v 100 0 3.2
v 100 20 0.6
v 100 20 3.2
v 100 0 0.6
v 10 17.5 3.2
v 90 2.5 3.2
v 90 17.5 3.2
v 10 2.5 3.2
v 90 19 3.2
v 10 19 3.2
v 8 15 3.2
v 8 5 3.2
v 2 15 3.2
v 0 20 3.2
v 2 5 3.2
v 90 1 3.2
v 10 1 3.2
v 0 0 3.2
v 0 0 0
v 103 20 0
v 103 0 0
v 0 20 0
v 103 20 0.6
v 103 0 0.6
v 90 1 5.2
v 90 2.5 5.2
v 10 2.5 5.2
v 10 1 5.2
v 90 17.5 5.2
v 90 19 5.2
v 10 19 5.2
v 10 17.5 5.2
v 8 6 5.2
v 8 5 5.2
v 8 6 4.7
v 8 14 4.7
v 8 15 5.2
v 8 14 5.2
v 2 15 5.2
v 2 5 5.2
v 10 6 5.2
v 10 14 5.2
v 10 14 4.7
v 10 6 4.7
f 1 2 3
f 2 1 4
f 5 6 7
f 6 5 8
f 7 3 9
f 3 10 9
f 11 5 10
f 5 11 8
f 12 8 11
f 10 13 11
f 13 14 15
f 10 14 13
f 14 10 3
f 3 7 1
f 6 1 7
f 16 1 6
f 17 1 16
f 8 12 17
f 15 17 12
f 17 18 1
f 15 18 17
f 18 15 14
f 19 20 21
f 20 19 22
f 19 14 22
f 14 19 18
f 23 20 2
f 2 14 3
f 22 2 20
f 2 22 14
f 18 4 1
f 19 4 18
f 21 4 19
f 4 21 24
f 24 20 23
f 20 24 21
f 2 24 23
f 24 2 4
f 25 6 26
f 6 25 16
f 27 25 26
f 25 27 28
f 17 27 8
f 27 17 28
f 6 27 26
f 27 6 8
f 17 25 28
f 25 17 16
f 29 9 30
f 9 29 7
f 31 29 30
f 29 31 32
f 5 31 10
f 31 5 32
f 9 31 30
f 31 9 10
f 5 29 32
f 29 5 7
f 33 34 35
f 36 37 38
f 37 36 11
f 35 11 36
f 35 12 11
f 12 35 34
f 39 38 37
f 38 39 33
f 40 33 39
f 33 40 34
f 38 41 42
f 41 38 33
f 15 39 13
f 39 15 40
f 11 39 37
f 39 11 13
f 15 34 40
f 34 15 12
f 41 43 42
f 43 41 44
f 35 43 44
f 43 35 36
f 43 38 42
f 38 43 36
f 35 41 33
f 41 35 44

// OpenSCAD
// Bag clip with living hinge - PETG, 0.4mm nozzle, no supports
// Printed open flat (two arms end-to-end), closes by folding 180deg about Y.
// Lower arm at origin, upper arm local origin at its hinge edge.

part = "arm_lower"; // [arm_lower, arm_upper, assembly]
cadverify_only = "";

/* Dimensions (mm) */
Lbody = 100;      // arm body length
Wbody = 20;       // arm width
Tbody = 3.2;      // arm thickness
Hhinge = 6;       // total hinge length (gap between bodies)
Hhalf = 3;        // hinge half length per arm
Thinge = 0.6;     // hinge thickness
Bgap = 2.0;       // bag thickness / closed gap
Ttot = Tbody + Bgap; // 5.2 closed inner top
Zpiv = Tbody + Bgap/2; // 4.2 pivot height
Xpiv = Lbody + Hhalf;  // 103 pivot X in assembly

module instance(name, part, unit = 1) {
    echo(cadverify_instance = [name, part, unit]);
    if (cadverify_only == "" || cadverify_only == name) children();
}

// ---------- lower arm geometry (print orientation, min at 0) ----------
module arm_lower() {
    // body
    cube([Lbody, Wbody, Tbody], false);
    // hinge half (thin, on bed), overlap 0.1 into body
    translate([Lbody-0.1, 0, 0])
        cube([Hhalf+0.1, Wbody, Thinge], false);
    // (no heel: the ribs and latch towers are the close stop)
    // ribs (2mm tall standoff), overlap 0.1 into body
    translate([10, 1, Tbody-0.1])
        cube([80, 1.5, Bgap+0.1], false);
    translate([10, 17.5, Tbody-0.1])
        cube([80, 1.5, Bgap+0.1], false);
    // latch tower, overlap into body
    translate([2, 5, Tbody-0.1])
        cube([6, 10, Bgap+0.1], false);
    // latch lip (cantilever +X), overlap into tower
    translate([7.9, 6, 4.7])
        cube([2.1, 8, 0.5], false);
}

// ---------- upper arm geometry (print orientation, hinge at x=0) ----------
module arm_upper() {
    // hinge half on bed
    cube([Hhalf+0.1, Wbody, Thinge], false);
    // body, overlap into hinge
    translate([Hhalf-0.1, 0, 0])
        cube([Lbody+0.1, Wbody, Tbody], false);
    // latch tower (maps to closed x=12-18), overlap into body
    translate([85, 5, Tbody-0.1])
        cube([6, 10, Bgap+0.1], false);
    // latch lip (extends +X toward free end), overlap into tower
    translate([90.9, 6, 4.2])
        cube([2.5, 8, 0.5], false);
    // thumb tab beyond free end, same thickness as body, overlap
    translate([102.9, 6, 0])
        cube([8.1, 8, Tbody], false);
}

// ---------- part / assembly dispatch ----------
if (part == "arm_lower") {
    echo(cadverify_spec = [
        ["bounds", [[0, 0, 0], [103, 20, 5.2]]],
        ["bodies", 1],
        ["through_holes", 0],
        ["support_faces", [["bed", "-z", 1500]]],
        ["overhangs_allowed", [["latch lip", [[7.5, 5.5, 4.0], [10.5, 14.5, 5.5]]]]],
        ["copies", 1],
        ["details", [
            ["arm", "material", [[20, 6, 1.0], [80, 14, 2.2]], 1],
            ["arm_wall", "thickness", [50, 10, 10], [0, 0, -1], 3.2],
            ["hinge", "thickness", [101.5, 10, 5], [0, 0, -1], 0.6],
            ["rib", "material", [[20, 1.2, 3.5], [80, 2.3, 5.0]], 1],
            ["latch_tower", "material", [[3, 6, 3.5], [7, 14, 5.0]], 1],
            ["latch_lip", "material", [[8.5, 8, 4.8], [9.5, 12, 5.1]], 0.9],
            ["bag_slot", "void", [[20, 3, 3.5], [80, 17, 5.0]], 1]
        ]]
    ]);
    arm_lower();
} else if (part == "arm_upper") {
    echo(cadverify_spec = [
        ["bounds", [[0, 0, 0], [111, 20, 5.2]]],
        ["bodies", 1],
        ["through_holes", 0],
        ["support_faces", [["bed", "-z", 1500]]],
        ["overhangs_allowed", [["latch lip", [[90.5, 5.5, 4.0], [94.5, 14.5, 5.5]]]]],
        ["copies", 1],
        ["details", [
            ["arm", "material", [[10, 6, 1.0], [80, 14, 2.2]], 1],
            ["arm_wall", "thickness", [50, 10, 10], [0, 0, -1], 3.2],
            ["hinge", "thickness", [1.5, 10, 5], [0, 0, -1], 0.6],
            ["latch_tower", "material", [[86, 6, 3.5], [90, 14, 5.0]], 1],
            ["latch_lip", "material", [[91.5, 8, 4.3], [92.5, 12, 4.6]], 0.9],
            ["thumb_tab", "material", [[104, 7, 1.0], [110, 13, 2.2]], 1],
            ["field", "void", [[10, 3, 3.5], [80, 17, 5.0]], 1]
        ]]
    ]);
    arm_upper();
} else if (part == "assembly") {
    echo(cadverify_spec = [
        ["bounds", [[0, 0, 0], [214, 20, 5.2]]],
        ["support_faces", [["bed", "-z", 3000]]],
        ["motions", [
            ["close", ["upper"], "rotate", [103, 10, 4.2], [0, 1, 0], [0, 180],
                ["flex", [["upper", "lower", 1.0, "latch snap"]]]
            ]
        ]],
        ["assembly_order", [
            [["lower"], [0, 0, 0]],
            [["upper"], [0, 0, -1]]
        ]]
    ]);
    instance("lower", "arm_lower") arm_lower();
    instance("upper", "arm_upper") translate([103, 0, 0]) arm_upper();
}
